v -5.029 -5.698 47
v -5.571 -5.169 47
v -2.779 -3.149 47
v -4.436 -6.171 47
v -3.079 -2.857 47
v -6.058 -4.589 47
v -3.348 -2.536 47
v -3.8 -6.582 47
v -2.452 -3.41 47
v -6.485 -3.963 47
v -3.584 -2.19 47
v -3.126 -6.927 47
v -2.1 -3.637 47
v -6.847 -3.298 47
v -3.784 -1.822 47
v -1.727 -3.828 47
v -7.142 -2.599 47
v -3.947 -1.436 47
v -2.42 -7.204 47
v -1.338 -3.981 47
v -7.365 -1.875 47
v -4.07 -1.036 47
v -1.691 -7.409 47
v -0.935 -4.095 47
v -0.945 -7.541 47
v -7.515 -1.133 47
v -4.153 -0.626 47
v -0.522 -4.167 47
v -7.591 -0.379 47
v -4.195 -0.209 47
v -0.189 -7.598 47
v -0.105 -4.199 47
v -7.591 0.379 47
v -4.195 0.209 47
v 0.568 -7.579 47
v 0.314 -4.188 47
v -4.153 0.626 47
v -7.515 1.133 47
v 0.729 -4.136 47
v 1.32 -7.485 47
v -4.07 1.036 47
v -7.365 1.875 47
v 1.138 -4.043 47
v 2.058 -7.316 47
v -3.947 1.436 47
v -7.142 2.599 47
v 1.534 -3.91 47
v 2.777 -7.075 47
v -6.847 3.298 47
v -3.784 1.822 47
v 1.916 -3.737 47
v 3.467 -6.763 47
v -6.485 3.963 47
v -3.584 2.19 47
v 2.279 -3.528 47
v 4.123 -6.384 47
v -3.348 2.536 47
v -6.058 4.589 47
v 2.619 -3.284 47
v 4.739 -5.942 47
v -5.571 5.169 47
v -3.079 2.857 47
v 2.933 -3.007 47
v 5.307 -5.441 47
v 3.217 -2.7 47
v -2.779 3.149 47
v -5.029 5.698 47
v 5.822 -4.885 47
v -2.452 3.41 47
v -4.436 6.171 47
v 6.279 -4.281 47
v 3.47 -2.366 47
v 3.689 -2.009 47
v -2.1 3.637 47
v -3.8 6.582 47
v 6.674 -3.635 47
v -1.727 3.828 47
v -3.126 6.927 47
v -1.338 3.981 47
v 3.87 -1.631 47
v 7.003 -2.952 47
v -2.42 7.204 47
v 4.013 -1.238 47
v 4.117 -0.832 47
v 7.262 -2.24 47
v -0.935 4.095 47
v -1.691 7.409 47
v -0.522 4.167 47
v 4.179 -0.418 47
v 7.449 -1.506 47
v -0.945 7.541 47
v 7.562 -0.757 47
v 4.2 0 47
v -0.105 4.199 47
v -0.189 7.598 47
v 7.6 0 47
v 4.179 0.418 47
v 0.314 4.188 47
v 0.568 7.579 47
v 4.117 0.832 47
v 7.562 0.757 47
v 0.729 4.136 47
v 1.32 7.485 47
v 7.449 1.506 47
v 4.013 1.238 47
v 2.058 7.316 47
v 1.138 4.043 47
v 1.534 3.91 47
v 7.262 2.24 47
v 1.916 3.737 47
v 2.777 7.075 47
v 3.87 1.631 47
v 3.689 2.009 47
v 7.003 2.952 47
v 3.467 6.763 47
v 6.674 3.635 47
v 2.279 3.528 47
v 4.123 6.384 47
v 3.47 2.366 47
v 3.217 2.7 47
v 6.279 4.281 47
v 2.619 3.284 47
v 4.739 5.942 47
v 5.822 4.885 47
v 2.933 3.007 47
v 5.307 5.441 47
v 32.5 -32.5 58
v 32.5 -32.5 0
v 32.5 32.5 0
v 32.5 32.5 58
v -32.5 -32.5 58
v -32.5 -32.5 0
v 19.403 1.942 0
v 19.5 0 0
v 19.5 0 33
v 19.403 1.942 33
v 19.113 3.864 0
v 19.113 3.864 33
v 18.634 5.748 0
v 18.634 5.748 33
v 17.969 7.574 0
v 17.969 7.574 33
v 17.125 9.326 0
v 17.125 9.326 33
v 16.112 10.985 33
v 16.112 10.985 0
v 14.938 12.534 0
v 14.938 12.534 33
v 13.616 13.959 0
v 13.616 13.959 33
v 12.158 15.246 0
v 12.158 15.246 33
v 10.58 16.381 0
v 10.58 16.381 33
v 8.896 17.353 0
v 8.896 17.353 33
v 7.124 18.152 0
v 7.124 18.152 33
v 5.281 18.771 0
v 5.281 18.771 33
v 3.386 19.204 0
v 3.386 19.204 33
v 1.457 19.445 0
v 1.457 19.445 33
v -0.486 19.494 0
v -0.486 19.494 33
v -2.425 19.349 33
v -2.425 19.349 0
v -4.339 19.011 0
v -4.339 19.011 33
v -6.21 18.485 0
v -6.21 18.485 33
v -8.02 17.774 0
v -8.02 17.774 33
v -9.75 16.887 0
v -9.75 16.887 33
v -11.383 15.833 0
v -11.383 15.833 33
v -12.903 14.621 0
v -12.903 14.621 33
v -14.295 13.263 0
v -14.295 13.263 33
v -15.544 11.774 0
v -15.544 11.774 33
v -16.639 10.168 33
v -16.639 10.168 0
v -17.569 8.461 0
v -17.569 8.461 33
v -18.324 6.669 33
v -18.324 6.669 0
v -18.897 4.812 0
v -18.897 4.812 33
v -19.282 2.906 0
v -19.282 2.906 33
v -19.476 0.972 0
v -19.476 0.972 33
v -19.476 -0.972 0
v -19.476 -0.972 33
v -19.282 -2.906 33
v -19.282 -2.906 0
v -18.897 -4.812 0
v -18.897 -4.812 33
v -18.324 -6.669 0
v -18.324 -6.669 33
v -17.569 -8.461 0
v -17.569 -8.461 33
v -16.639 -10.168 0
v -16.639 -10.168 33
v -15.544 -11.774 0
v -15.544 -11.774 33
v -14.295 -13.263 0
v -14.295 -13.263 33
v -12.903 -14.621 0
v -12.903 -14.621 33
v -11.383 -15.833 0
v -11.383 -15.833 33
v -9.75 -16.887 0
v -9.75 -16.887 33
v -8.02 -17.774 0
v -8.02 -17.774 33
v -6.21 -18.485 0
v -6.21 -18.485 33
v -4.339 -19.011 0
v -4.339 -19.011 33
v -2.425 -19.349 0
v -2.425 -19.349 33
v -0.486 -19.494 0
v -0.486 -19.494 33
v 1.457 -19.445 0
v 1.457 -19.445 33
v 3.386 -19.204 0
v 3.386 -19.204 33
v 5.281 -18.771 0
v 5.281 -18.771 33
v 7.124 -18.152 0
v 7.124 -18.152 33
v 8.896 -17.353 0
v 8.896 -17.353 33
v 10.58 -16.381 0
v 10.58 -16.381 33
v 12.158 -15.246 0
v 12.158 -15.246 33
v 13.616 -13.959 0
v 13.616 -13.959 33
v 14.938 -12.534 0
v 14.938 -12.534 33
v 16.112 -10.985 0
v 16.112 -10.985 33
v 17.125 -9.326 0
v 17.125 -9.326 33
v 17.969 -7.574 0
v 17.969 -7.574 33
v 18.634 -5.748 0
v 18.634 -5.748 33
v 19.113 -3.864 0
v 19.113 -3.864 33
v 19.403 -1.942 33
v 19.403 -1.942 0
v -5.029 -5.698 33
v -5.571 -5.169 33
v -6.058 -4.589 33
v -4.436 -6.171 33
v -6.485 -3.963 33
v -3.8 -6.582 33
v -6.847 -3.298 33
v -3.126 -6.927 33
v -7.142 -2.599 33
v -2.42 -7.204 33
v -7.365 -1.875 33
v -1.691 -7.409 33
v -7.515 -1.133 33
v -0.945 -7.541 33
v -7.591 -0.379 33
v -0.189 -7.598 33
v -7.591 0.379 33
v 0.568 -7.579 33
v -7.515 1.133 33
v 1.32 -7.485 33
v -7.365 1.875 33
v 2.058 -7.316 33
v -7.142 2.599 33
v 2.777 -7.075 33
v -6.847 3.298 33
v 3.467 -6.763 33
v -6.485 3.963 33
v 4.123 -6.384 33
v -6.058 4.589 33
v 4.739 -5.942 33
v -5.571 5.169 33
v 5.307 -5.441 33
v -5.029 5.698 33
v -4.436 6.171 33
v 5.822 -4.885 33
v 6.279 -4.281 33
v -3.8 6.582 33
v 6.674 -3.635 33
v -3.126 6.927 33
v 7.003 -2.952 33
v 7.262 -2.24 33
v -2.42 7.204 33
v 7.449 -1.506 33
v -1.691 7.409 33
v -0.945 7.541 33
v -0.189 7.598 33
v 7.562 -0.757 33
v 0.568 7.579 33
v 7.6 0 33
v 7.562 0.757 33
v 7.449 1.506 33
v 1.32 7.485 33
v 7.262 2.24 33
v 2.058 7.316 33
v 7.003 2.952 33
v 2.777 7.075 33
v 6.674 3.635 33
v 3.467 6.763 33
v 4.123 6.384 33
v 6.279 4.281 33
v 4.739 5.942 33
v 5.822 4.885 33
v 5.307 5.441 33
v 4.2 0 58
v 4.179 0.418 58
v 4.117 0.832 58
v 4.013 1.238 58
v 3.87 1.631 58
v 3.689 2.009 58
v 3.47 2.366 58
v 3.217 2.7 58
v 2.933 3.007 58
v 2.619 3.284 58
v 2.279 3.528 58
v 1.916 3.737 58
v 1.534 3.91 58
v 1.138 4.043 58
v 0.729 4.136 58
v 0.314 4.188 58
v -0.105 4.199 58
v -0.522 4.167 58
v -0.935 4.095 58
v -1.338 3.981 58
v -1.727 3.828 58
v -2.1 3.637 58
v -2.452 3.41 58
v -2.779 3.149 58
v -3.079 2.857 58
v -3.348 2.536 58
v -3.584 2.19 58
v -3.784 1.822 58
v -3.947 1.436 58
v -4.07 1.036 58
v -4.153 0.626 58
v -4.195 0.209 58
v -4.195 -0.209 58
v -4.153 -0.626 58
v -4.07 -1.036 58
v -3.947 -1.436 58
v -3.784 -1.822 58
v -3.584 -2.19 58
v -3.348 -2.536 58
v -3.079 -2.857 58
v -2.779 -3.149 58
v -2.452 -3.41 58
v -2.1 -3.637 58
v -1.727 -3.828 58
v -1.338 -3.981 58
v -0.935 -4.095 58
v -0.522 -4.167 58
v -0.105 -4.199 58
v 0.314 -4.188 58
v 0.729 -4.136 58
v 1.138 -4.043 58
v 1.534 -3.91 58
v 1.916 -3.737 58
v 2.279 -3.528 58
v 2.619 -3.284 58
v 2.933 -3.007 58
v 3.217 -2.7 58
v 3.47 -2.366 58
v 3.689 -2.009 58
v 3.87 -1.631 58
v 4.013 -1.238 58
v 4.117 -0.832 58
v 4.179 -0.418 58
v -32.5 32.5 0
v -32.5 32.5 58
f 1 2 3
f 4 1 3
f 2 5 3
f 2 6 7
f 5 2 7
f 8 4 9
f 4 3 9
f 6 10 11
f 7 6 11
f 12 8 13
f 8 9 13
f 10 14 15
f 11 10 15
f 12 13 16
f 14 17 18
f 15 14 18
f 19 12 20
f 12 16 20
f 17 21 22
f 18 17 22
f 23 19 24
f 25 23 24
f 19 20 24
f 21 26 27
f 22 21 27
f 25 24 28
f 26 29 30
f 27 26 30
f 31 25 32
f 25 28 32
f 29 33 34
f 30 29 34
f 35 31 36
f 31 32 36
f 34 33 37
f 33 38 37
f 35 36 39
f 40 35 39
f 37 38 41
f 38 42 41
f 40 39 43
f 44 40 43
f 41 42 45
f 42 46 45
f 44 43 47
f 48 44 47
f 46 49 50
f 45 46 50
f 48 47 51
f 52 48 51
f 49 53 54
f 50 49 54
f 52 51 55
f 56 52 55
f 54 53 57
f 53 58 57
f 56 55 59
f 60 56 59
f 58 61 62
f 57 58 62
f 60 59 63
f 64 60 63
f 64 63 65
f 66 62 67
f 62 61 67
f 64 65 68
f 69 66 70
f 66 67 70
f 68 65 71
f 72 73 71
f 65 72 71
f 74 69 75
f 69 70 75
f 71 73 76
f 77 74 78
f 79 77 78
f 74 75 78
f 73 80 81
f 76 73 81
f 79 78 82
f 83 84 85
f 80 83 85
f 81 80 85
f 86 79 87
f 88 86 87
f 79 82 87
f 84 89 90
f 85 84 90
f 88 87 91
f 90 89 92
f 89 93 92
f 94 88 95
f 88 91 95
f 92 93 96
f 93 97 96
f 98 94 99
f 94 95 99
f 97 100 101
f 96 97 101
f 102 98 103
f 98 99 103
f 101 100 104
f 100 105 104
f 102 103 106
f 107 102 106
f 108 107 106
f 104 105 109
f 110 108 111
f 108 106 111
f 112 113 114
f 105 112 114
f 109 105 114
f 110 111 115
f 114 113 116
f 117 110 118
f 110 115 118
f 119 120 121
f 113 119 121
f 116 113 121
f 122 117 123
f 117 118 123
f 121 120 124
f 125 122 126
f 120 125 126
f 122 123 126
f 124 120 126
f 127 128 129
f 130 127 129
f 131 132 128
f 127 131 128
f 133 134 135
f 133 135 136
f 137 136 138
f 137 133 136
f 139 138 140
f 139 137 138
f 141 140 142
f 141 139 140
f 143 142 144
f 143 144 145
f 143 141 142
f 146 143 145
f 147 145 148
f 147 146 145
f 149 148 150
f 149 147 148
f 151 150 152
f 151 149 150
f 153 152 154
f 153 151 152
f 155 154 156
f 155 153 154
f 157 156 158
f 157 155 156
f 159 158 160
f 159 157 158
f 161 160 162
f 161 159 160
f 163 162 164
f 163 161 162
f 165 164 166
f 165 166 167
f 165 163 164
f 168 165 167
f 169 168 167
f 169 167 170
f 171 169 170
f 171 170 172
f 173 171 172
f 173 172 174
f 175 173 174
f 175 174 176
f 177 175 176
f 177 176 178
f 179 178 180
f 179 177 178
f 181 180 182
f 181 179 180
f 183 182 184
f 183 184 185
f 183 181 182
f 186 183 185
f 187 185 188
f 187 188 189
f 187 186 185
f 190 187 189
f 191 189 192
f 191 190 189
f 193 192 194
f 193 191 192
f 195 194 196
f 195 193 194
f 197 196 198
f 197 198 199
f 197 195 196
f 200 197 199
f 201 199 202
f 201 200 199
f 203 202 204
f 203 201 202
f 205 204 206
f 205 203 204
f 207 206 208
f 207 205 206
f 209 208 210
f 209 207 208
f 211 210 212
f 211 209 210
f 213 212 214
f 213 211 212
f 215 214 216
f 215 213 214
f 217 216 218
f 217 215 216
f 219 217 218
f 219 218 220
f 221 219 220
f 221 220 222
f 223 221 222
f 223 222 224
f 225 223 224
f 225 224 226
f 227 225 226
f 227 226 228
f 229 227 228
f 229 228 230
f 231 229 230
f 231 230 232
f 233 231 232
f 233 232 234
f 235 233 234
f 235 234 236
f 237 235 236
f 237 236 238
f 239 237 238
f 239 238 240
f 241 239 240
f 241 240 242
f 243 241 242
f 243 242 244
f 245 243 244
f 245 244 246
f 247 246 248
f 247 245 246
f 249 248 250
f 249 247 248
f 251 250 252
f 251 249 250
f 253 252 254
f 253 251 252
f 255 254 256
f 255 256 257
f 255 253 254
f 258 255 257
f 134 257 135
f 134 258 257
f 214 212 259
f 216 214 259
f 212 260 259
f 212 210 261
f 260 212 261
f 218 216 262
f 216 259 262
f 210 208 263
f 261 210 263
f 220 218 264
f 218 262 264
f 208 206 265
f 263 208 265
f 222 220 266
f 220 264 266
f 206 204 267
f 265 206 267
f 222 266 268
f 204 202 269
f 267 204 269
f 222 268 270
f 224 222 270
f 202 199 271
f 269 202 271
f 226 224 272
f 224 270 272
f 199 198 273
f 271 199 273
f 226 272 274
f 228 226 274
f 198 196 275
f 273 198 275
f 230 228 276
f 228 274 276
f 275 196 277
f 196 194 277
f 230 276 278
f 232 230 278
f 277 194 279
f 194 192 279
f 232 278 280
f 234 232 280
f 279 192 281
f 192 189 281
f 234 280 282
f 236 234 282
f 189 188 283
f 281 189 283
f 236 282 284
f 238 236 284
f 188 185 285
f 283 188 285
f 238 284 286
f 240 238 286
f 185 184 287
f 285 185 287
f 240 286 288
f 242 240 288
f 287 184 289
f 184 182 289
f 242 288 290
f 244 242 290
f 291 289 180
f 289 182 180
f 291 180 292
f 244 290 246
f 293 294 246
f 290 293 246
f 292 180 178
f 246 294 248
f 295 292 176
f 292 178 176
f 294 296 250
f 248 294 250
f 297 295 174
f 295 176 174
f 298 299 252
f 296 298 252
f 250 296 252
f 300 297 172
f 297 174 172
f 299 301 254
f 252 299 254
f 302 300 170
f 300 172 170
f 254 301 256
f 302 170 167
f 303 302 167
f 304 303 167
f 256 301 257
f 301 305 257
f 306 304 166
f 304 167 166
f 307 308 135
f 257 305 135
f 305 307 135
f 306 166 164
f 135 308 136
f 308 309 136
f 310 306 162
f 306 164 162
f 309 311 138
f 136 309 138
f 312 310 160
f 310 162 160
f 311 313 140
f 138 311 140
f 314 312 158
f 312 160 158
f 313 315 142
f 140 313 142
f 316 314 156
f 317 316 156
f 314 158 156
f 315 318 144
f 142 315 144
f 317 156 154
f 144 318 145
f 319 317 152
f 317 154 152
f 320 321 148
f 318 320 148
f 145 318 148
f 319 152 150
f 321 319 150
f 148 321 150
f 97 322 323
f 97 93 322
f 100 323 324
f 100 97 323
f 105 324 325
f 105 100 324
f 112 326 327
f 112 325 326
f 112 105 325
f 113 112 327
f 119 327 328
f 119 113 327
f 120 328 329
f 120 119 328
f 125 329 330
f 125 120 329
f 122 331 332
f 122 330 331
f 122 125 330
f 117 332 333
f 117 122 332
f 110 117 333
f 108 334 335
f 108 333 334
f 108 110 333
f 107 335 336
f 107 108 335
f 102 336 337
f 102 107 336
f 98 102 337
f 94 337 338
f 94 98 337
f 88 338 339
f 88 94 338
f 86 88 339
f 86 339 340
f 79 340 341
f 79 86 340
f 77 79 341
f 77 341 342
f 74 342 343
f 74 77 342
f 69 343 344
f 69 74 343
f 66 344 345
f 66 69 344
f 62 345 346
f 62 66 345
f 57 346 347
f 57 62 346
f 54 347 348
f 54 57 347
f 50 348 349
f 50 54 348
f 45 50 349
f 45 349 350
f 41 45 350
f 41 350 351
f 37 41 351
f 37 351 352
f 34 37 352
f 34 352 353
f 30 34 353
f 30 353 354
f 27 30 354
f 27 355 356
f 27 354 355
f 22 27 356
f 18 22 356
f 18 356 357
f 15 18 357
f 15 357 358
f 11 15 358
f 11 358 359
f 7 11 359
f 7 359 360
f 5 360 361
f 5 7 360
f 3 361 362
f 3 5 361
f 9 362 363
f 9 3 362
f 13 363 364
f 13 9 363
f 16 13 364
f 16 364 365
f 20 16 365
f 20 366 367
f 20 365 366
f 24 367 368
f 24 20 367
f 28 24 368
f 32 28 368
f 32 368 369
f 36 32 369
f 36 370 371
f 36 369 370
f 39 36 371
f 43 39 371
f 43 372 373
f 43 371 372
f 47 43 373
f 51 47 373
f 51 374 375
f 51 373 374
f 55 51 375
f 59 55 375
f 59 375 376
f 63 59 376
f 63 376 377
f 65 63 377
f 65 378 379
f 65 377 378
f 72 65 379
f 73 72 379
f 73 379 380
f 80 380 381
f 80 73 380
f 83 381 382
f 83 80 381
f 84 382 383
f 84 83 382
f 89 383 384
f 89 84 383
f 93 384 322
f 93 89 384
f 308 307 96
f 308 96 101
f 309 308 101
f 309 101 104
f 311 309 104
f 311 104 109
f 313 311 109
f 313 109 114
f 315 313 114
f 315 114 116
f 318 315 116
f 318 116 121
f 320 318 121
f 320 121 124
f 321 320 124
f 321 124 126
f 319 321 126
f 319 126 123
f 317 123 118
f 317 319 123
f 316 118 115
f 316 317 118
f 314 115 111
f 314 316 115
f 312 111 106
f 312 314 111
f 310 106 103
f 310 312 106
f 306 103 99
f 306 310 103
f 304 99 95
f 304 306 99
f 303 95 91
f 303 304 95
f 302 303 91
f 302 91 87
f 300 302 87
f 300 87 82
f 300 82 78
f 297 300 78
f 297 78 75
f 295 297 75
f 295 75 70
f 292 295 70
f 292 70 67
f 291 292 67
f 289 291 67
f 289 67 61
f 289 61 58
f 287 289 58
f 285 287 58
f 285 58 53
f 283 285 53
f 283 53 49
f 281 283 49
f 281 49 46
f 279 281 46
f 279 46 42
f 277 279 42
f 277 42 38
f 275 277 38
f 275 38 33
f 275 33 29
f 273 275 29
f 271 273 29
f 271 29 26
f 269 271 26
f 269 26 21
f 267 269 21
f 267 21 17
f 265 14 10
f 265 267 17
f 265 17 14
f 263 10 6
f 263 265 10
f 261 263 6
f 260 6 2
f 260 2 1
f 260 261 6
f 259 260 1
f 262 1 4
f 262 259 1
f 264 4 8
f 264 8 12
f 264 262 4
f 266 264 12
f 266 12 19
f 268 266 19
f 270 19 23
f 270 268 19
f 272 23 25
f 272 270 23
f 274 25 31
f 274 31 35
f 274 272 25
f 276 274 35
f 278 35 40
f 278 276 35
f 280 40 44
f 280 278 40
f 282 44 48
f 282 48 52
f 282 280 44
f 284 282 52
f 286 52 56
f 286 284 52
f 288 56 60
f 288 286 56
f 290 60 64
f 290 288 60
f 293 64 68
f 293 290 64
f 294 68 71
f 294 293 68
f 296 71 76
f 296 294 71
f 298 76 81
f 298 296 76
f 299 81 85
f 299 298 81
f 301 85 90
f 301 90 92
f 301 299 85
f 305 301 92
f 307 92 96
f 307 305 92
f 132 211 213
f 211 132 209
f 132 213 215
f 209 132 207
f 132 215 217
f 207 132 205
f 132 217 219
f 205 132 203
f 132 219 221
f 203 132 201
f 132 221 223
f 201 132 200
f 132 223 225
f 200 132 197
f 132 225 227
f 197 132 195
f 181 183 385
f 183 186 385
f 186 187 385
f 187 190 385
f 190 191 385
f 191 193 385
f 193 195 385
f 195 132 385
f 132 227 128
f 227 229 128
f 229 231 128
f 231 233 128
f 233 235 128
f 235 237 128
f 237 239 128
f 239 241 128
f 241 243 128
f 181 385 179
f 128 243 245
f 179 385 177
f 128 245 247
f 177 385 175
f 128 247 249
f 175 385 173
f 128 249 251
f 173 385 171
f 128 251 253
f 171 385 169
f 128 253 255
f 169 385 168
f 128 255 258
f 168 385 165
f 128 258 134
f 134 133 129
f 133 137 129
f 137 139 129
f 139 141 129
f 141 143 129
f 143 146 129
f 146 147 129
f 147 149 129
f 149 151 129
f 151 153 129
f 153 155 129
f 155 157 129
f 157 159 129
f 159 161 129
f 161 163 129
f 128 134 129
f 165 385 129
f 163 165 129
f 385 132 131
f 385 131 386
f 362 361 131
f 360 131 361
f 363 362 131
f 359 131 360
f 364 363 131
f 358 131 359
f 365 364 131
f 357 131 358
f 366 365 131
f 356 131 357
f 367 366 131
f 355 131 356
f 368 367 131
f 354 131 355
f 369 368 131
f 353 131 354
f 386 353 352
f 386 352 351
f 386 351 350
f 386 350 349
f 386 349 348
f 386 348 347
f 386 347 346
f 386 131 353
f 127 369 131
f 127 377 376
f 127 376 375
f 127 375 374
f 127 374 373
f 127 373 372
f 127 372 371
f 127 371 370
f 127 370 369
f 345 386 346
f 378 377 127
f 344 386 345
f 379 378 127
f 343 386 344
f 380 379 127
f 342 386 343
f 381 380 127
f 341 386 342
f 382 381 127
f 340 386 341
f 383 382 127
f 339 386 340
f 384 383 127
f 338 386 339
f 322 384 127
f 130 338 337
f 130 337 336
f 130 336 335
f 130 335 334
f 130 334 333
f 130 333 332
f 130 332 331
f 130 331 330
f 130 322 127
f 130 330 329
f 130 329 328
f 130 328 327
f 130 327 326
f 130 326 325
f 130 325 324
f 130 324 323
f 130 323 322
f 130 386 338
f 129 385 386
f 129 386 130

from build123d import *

# Parameters (mm, degrees)
F0_W     = 65
F0_H     = 65
F5_DEPTH = 58
F1_R     = 25.5
F6_DEPTH = 25
F3_R     = 4.2
F7_DEPTH = 134
F4_R     = 7.6
F8_DEPTH = 47
F2_R     = 19.5
F9_DEPTH = 33


with BuildPart() as f5:
    # F0 (on Top) → F5 (new body)
    with BuildSketch(Plane.XY):
        Rectangle(F0_W, F0_H)
    extrude(amount=F5_DEPTH)

    # F1 (on face) → F6 (join)
    with BuildSketch(Plane.XY):
        Circle(F1_R)
    extrude(amount=F6_DEPTH)

    # F3 (on Top) → F7 (cut)
    with BuildSketch(Plane.XY):
        Circle(F3_R)
    extrude(amount=F7_DEPTH, mode=Mode.SUBTRACT)

    # F4 (on Top) → F8 (cut)
    with BuildSketch(Plane.XY):
        Circle(F4_R)
    extrude(amount=F8_DEPTH, mode=Mode.SUBTRACT)

    # F2 (on Top) → F9 (cut)
    with BuildSketch(Plane.XY):
        Circle(F2_R)
    extrude(amount=F9_DEPTH, mode=Mode.SUBTRACT)


solid = f5.part
